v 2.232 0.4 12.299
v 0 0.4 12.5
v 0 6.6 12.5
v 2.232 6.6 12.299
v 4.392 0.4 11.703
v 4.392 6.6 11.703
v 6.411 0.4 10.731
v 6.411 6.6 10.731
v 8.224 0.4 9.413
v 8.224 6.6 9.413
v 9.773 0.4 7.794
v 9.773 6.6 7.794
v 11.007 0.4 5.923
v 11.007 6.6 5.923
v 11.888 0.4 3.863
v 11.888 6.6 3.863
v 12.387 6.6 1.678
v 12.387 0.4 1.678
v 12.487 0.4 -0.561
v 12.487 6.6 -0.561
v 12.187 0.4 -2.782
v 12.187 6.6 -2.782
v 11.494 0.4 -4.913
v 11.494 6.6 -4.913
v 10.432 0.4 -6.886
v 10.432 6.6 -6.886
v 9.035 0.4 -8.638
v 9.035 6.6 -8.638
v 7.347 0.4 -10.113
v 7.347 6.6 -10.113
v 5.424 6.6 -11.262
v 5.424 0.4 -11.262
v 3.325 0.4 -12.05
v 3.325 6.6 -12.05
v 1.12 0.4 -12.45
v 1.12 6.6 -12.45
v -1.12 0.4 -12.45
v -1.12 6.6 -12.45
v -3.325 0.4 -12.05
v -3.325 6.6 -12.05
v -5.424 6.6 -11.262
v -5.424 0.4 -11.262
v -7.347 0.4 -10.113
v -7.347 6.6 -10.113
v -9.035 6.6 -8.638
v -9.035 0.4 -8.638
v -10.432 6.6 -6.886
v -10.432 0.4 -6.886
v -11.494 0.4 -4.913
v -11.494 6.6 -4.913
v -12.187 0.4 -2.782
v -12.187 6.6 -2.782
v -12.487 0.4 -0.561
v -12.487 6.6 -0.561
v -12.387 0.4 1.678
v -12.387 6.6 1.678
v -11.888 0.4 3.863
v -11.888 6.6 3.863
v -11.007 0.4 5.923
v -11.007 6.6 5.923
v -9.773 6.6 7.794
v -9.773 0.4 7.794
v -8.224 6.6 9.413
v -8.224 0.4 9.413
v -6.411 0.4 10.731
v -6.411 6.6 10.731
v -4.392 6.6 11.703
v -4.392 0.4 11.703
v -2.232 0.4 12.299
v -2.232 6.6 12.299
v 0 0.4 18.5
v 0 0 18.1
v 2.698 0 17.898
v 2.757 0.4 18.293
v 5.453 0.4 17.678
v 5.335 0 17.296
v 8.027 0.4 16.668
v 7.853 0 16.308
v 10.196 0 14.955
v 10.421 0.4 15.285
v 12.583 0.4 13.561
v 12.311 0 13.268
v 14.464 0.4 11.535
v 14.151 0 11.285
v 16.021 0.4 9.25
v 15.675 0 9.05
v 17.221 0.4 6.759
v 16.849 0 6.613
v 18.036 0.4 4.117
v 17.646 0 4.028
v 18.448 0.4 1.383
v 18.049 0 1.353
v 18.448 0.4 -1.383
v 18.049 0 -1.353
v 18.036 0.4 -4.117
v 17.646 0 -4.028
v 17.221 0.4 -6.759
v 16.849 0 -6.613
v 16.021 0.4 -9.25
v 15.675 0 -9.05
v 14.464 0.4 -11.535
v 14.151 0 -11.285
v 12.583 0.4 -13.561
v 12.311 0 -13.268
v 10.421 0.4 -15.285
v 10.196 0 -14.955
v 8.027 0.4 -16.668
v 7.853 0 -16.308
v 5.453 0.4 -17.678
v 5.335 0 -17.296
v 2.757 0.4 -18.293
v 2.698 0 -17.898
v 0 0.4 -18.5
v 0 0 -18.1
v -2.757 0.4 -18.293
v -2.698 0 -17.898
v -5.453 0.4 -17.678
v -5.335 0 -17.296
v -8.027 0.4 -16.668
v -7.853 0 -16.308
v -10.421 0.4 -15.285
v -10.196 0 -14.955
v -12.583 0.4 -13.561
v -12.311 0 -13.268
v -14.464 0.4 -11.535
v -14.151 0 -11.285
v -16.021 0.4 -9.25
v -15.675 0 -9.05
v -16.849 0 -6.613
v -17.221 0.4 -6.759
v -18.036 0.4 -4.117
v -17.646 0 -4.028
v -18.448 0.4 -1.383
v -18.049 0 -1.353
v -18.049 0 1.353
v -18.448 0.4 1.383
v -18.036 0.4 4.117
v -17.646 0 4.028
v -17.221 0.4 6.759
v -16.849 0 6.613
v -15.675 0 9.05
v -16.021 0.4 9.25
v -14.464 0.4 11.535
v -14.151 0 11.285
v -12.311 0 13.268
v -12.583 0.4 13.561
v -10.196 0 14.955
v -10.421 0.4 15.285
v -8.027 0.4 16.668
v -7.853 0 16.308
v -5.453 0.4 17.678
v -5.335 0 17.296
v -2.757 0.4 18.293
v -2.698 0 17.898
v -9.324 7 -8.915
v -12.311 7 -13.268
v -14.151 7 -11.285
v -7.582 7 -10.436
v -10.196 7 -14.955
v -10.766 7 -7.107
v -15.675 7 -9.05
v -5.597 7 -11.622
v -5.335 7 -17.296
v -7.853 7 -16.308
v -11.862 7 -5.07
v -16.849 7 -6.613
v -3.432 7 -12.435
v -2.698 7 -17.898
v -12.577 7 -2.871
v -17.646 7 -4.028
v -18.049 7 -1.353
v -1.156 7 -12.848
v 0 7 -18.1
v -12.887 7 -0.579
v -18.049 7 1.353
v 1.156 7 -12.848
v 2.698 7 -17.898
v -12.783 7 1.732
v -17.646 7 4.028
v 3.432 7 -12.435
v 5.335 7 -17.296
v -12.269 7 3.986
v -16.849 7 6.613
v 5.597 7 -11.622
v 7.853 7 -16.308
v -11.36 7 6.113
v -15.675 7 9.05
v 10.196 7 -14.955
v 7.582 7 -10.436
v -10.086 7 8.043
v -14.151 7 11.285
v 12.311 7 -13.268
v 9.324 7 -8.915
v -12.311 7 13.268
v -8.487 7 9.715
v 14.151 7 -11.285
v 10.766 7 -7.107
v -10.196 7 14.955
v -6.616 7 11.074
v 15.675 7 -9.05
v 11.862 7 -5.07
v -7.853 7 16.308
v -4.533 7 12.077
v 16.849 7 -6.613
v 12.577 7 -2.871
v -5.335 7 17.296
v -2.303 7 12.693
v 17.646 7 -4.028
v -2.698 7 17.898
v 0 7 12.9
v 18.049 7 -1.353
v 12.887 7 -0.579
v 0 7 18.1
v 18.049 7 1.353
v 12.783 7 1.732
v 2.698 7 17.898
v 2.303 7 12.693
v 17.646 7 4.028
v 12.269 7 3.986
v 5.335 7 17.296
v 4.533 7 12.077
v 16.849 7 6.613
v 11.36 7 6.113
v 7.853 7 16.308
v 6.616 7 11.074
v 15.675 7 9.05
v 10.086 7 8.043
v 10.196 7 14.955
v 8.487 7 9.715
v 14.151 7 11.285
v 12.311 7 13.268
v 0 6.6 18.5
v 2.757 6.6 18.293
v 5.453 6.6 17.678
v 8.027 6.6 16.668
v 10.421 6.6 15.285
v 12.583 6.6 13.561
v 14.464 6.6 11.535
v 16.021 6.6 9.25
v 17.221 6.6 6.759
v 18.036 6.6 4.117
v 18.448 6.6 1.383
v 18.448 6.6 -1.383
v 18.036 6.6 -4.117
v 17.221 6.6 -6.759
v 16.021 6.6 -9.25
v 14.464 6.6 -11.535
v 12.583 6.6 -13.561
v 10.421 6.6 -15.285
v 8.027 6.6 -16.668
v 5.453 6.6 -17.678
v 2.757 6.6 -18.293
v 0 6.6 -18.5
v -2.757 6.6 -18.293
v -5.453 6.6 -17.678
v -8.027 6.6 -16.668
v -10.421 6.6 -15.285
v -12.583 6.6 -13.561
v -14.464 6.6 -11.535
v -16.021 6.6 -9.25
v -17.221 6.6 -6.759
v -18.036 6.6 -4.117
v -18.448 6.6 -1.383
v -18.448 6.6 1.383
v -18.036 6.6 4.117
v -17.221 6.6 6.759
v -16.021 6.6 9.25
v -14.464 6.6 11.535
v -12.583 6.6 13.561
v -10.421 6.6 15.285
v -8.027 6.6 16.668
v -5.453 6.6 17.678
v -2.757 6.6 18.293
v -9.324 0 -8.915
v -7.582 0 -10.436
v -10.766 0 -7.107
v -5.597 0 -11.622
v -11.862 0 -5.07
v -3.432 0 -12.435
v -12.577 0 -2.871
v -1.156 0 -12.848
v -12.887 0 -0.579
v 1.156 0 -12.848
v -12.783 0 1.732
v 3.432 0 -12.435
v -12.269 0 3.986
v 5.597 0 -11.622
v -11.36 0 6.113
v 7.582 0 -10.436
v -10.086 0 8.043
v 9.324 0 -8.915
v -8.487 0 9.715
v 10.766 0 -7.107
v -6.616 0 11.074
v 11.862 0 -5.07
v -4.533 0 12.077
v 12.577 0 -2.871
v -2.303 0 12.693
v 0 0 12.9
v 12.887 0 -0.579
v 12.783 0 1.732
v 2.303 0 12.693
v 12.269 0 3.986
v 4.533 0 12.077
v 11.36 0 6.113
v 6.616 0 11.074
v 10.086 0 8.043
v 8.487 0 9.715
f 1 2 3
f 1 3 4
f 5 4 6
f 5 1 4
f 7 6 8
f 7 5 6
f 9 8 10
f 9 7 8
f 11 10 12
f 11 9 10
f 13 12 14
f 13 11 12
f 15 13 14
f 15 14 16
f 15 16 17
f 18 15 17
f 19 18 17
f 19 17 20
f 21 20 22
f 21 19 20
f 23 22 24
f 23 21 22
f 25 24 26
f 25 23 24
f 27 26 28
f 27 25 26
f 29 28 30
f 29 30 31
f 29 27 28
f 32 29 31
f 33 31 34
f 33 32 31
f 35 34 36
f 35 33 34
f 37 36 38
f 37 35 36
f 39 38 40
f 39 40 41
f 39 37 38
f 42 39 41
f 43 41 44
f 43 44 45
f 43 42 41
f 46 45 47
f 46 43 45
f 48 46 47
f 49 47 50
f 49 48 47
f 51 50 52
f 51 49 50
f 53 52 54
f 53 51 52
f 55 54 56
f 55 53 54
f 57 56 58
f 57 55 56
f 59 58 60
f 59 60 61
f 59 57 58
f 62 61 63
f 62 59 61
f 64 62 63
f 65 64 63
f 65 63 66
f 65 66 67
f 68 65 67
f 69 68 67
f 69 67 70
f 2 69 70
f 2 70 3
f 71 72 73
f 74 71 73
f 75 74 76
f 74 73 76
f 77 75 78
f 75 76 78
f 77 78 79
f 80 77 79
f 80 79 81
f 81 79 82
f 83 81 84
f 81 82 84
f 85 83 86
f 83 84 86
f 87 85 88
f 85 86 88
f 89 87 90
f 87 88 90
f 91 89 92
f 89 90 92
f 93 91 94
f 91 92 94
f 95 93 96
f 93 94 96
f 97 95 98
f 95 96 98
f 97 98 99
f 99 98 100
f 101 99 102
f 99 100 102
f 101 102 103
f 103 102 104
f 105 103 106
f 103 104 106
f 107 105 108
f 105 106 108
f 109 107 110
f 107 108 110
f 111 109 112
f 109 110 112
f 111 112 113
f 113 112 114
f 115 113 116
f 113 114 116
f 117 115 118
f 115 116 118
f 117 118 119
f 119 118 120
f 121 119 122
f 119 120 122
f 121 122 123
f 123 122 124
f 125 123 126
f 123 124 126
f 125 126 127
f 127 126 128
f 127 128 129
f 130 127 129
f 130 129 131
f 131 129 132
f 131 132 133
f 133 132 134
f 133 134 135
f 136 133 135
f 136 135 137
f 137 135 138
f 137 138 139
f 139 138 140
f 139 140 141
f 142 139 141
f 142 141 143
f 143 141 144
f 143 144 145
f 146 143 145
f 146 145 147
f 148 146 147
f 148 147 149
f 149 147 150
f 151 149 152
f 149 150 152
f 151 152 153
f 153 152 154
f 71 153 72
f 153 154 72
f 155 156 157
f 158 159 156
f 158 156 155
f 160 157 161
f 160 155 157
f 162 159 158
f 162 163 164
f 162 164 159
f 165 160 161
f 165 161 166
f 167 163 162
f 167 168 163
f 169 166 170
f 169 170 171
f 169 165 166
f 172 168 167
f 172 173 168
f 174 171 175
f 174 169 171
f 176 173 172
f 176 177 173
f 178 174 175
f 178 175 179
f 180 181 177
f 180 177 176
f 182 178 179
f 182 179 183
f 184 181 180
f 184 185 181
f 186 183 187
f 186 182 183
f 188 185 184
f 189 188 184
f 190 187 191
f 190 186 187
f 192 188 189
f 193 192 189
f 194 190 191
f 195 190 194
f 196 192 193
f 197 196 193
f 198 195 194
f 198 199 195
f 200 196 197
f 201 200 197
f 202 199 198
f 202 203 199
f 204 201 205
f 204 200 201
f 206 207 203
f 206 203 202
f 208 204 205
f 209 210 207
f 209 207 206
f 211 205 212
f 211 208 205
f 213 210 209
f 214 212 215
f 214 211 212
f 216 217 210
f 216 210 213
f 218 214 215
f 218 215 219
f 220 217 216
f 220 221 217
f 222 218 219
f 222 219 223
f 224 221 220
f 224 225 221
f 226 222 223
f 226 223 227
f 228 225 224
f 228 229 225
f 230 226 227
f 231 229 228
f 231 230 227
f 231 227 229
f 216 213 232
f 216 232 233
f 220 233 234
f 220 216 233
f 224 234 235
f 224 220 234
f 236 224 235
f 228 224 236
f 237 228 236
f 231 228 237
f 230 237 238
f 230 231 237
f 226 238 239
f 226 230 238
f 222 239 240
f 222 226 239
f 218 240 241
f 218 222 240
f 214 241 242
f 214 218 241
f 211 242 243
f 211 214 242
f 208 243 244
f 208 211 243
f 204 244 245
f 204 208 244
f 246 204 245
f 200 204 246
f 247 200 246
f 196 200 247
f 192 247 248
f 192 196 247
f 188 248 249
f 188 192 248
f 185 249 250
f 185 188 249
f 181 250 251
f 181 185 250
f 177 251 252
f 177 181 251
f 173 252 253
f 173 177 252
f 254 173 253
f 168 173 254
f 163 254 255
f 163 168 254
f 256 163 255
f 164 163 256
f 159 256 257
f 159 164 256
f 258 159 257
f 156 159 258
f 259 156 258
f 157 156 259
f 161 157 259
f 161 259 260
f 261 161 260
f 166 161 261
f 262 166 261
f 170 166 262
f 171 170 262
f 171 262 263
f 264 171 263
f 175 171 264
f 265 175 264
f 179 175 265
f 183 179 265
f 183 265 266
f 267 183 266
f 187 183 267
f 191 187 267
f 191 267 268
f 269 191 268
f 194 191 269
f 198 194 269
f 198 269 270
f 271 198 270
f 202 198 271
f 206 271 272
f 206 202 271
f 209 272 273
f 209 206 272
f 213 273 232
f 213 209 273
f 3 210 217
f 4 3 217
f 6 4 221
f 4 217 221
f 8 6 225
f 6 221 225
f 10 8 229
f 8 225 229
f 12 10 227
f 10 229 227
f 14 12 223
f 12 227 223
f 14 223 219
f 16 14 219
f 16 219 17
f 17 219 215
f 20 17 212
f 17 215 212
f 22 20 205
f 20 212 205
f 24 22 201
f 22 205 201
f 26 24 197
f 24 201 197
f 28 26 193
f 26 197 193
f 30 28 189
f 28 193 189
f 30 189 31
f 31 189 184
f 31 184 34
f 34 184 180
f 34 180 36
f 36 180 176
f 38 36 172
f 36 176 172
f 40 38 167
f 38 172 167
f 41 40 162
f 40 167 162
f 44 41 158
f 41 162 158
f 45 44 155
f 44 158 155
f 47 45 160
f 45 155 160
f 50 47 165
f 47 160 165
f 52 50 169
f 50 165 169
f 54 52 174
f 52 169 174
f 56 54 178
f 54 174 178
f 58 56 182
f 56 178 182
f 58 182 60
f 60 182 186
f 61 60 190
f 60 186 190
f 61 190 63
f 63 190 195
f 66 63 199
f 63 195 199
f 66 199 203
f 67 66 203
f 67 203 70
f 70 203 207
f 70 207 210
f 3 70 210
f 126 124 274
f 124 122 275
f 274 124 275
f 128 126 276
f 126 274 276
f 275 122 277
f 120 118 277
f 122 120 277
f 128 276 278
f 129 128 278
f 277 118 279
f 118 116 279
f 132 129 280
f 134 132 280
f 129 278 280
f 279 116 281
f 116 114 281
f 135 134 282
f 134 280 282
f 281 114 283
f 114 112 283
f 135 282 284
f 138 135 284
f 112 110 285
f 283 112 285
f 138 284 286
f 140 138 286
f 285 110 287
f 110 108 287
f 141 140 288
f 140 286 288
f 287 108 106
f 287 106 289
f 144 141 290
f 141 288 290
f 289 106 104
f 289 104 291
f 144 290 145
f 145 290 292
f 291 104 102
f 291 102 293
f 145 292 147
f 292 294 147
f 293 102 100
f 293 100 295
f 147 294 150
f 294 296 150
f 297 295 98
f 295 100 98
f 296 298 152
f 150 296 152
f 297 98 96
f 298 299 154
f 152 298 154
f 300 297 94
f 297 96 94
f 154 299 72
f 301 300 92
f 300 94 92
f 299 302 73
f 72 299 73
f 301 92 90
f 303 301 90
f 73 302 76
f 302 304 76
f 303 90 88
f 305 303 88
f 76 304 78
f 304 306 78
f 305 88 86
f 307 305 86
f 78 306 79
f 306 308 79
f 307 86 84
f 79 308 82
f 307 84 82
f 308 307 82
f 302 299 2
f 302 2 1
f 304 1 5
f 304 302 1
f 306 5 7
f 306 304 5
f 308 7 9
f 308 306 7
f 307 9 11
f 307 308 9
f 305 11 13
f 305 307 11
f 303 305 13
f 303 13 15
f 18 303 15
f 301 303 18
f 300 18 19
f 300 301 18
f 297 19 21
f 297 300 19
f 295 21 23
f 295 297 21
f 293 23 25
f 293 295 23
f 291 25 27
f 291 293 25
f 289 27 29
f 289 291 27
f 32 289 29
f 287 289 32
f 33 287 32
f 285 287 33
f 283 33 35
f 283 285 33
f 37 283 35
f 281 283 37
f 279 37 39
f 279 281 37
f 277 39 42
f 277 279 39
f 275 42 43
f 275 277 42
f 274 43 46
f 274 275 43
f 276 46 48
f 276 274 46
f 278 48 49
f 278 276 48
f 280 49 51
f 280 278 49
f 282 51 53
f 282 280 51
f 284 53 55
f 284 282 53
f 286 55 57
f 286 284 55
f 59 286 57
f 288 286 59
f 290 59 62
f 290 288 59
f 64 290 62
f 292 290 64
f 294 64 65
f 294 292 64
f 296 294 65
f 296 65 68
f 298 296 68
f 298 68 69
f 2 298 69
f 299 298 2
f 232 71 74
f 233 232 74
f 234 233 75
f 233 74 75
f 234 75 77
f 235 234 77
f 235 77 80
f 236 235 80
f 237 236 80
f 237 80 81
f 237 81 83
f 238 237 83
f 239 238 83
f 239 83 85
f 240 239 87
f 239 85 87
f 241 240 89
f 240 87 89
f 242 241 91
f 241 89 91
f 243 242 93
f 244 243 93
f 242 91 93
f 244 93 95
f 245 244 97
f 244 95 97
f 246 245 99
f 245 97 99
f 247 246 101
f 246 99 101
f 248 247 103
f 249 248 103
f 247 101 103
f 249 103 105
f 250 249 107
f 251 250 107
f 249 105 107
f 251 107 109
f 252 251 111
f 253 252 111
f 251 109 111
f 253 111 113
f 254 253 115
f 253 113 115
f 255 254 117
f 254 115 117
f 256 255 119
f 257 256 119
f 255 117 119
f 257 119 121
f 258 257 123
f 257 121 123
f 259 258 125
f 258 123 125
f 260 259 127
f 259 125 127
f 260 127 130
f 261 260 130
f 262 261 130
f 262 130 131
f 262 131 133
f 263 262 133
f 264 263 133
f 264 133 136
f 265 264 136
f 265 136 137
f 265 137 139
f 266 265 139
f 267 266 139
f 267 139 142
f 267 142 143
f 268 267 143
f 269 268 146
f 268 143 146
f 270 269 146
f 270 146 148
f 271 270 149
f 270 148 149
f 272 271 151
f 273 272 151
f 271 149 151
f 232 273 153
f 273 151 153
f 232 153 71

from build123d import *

# Parameters (mm, degrees)
SKETCH1_R           = 18.5
SKETCH1_R_2         = 12.5
BOSS_EXTRUDE1_DEPTH = 7
CHAMFER1_SIZE       = 0.4


with BuildPart() as part:
    # Sketch1 → Boss-Extrude1 (new body)
    with BuildSketch(Plane(origin=(0, 0, 0), x_dir=(1, 0, 0), z_dir=(0, 1, 0))):
        with Locations(Location((0, 0, 0), (0, 0, 270))):
            Circle(SKETCH1_R)
        with Locations(Location((0, 0, 0), (0, 0, 270))):
            Circle(SKETCH1_R_2, mode=Mode.SUBTRACT)
    extrude(amount=BOSS_EXTRUDE1_DEPTH)

    # Chamfer1
    chamfer1_edges = [part.edges().sort_by_distance(p)[0] for p in [
        (0, 0, -18.5),
        (0, 7, -18.5),
        (0, 0, -12.5),
        (0, 7, -12.5),
    ]]
    chamfer(chamfer1_edges, length=CHAMFER1_SIZE)


solid = part.part
